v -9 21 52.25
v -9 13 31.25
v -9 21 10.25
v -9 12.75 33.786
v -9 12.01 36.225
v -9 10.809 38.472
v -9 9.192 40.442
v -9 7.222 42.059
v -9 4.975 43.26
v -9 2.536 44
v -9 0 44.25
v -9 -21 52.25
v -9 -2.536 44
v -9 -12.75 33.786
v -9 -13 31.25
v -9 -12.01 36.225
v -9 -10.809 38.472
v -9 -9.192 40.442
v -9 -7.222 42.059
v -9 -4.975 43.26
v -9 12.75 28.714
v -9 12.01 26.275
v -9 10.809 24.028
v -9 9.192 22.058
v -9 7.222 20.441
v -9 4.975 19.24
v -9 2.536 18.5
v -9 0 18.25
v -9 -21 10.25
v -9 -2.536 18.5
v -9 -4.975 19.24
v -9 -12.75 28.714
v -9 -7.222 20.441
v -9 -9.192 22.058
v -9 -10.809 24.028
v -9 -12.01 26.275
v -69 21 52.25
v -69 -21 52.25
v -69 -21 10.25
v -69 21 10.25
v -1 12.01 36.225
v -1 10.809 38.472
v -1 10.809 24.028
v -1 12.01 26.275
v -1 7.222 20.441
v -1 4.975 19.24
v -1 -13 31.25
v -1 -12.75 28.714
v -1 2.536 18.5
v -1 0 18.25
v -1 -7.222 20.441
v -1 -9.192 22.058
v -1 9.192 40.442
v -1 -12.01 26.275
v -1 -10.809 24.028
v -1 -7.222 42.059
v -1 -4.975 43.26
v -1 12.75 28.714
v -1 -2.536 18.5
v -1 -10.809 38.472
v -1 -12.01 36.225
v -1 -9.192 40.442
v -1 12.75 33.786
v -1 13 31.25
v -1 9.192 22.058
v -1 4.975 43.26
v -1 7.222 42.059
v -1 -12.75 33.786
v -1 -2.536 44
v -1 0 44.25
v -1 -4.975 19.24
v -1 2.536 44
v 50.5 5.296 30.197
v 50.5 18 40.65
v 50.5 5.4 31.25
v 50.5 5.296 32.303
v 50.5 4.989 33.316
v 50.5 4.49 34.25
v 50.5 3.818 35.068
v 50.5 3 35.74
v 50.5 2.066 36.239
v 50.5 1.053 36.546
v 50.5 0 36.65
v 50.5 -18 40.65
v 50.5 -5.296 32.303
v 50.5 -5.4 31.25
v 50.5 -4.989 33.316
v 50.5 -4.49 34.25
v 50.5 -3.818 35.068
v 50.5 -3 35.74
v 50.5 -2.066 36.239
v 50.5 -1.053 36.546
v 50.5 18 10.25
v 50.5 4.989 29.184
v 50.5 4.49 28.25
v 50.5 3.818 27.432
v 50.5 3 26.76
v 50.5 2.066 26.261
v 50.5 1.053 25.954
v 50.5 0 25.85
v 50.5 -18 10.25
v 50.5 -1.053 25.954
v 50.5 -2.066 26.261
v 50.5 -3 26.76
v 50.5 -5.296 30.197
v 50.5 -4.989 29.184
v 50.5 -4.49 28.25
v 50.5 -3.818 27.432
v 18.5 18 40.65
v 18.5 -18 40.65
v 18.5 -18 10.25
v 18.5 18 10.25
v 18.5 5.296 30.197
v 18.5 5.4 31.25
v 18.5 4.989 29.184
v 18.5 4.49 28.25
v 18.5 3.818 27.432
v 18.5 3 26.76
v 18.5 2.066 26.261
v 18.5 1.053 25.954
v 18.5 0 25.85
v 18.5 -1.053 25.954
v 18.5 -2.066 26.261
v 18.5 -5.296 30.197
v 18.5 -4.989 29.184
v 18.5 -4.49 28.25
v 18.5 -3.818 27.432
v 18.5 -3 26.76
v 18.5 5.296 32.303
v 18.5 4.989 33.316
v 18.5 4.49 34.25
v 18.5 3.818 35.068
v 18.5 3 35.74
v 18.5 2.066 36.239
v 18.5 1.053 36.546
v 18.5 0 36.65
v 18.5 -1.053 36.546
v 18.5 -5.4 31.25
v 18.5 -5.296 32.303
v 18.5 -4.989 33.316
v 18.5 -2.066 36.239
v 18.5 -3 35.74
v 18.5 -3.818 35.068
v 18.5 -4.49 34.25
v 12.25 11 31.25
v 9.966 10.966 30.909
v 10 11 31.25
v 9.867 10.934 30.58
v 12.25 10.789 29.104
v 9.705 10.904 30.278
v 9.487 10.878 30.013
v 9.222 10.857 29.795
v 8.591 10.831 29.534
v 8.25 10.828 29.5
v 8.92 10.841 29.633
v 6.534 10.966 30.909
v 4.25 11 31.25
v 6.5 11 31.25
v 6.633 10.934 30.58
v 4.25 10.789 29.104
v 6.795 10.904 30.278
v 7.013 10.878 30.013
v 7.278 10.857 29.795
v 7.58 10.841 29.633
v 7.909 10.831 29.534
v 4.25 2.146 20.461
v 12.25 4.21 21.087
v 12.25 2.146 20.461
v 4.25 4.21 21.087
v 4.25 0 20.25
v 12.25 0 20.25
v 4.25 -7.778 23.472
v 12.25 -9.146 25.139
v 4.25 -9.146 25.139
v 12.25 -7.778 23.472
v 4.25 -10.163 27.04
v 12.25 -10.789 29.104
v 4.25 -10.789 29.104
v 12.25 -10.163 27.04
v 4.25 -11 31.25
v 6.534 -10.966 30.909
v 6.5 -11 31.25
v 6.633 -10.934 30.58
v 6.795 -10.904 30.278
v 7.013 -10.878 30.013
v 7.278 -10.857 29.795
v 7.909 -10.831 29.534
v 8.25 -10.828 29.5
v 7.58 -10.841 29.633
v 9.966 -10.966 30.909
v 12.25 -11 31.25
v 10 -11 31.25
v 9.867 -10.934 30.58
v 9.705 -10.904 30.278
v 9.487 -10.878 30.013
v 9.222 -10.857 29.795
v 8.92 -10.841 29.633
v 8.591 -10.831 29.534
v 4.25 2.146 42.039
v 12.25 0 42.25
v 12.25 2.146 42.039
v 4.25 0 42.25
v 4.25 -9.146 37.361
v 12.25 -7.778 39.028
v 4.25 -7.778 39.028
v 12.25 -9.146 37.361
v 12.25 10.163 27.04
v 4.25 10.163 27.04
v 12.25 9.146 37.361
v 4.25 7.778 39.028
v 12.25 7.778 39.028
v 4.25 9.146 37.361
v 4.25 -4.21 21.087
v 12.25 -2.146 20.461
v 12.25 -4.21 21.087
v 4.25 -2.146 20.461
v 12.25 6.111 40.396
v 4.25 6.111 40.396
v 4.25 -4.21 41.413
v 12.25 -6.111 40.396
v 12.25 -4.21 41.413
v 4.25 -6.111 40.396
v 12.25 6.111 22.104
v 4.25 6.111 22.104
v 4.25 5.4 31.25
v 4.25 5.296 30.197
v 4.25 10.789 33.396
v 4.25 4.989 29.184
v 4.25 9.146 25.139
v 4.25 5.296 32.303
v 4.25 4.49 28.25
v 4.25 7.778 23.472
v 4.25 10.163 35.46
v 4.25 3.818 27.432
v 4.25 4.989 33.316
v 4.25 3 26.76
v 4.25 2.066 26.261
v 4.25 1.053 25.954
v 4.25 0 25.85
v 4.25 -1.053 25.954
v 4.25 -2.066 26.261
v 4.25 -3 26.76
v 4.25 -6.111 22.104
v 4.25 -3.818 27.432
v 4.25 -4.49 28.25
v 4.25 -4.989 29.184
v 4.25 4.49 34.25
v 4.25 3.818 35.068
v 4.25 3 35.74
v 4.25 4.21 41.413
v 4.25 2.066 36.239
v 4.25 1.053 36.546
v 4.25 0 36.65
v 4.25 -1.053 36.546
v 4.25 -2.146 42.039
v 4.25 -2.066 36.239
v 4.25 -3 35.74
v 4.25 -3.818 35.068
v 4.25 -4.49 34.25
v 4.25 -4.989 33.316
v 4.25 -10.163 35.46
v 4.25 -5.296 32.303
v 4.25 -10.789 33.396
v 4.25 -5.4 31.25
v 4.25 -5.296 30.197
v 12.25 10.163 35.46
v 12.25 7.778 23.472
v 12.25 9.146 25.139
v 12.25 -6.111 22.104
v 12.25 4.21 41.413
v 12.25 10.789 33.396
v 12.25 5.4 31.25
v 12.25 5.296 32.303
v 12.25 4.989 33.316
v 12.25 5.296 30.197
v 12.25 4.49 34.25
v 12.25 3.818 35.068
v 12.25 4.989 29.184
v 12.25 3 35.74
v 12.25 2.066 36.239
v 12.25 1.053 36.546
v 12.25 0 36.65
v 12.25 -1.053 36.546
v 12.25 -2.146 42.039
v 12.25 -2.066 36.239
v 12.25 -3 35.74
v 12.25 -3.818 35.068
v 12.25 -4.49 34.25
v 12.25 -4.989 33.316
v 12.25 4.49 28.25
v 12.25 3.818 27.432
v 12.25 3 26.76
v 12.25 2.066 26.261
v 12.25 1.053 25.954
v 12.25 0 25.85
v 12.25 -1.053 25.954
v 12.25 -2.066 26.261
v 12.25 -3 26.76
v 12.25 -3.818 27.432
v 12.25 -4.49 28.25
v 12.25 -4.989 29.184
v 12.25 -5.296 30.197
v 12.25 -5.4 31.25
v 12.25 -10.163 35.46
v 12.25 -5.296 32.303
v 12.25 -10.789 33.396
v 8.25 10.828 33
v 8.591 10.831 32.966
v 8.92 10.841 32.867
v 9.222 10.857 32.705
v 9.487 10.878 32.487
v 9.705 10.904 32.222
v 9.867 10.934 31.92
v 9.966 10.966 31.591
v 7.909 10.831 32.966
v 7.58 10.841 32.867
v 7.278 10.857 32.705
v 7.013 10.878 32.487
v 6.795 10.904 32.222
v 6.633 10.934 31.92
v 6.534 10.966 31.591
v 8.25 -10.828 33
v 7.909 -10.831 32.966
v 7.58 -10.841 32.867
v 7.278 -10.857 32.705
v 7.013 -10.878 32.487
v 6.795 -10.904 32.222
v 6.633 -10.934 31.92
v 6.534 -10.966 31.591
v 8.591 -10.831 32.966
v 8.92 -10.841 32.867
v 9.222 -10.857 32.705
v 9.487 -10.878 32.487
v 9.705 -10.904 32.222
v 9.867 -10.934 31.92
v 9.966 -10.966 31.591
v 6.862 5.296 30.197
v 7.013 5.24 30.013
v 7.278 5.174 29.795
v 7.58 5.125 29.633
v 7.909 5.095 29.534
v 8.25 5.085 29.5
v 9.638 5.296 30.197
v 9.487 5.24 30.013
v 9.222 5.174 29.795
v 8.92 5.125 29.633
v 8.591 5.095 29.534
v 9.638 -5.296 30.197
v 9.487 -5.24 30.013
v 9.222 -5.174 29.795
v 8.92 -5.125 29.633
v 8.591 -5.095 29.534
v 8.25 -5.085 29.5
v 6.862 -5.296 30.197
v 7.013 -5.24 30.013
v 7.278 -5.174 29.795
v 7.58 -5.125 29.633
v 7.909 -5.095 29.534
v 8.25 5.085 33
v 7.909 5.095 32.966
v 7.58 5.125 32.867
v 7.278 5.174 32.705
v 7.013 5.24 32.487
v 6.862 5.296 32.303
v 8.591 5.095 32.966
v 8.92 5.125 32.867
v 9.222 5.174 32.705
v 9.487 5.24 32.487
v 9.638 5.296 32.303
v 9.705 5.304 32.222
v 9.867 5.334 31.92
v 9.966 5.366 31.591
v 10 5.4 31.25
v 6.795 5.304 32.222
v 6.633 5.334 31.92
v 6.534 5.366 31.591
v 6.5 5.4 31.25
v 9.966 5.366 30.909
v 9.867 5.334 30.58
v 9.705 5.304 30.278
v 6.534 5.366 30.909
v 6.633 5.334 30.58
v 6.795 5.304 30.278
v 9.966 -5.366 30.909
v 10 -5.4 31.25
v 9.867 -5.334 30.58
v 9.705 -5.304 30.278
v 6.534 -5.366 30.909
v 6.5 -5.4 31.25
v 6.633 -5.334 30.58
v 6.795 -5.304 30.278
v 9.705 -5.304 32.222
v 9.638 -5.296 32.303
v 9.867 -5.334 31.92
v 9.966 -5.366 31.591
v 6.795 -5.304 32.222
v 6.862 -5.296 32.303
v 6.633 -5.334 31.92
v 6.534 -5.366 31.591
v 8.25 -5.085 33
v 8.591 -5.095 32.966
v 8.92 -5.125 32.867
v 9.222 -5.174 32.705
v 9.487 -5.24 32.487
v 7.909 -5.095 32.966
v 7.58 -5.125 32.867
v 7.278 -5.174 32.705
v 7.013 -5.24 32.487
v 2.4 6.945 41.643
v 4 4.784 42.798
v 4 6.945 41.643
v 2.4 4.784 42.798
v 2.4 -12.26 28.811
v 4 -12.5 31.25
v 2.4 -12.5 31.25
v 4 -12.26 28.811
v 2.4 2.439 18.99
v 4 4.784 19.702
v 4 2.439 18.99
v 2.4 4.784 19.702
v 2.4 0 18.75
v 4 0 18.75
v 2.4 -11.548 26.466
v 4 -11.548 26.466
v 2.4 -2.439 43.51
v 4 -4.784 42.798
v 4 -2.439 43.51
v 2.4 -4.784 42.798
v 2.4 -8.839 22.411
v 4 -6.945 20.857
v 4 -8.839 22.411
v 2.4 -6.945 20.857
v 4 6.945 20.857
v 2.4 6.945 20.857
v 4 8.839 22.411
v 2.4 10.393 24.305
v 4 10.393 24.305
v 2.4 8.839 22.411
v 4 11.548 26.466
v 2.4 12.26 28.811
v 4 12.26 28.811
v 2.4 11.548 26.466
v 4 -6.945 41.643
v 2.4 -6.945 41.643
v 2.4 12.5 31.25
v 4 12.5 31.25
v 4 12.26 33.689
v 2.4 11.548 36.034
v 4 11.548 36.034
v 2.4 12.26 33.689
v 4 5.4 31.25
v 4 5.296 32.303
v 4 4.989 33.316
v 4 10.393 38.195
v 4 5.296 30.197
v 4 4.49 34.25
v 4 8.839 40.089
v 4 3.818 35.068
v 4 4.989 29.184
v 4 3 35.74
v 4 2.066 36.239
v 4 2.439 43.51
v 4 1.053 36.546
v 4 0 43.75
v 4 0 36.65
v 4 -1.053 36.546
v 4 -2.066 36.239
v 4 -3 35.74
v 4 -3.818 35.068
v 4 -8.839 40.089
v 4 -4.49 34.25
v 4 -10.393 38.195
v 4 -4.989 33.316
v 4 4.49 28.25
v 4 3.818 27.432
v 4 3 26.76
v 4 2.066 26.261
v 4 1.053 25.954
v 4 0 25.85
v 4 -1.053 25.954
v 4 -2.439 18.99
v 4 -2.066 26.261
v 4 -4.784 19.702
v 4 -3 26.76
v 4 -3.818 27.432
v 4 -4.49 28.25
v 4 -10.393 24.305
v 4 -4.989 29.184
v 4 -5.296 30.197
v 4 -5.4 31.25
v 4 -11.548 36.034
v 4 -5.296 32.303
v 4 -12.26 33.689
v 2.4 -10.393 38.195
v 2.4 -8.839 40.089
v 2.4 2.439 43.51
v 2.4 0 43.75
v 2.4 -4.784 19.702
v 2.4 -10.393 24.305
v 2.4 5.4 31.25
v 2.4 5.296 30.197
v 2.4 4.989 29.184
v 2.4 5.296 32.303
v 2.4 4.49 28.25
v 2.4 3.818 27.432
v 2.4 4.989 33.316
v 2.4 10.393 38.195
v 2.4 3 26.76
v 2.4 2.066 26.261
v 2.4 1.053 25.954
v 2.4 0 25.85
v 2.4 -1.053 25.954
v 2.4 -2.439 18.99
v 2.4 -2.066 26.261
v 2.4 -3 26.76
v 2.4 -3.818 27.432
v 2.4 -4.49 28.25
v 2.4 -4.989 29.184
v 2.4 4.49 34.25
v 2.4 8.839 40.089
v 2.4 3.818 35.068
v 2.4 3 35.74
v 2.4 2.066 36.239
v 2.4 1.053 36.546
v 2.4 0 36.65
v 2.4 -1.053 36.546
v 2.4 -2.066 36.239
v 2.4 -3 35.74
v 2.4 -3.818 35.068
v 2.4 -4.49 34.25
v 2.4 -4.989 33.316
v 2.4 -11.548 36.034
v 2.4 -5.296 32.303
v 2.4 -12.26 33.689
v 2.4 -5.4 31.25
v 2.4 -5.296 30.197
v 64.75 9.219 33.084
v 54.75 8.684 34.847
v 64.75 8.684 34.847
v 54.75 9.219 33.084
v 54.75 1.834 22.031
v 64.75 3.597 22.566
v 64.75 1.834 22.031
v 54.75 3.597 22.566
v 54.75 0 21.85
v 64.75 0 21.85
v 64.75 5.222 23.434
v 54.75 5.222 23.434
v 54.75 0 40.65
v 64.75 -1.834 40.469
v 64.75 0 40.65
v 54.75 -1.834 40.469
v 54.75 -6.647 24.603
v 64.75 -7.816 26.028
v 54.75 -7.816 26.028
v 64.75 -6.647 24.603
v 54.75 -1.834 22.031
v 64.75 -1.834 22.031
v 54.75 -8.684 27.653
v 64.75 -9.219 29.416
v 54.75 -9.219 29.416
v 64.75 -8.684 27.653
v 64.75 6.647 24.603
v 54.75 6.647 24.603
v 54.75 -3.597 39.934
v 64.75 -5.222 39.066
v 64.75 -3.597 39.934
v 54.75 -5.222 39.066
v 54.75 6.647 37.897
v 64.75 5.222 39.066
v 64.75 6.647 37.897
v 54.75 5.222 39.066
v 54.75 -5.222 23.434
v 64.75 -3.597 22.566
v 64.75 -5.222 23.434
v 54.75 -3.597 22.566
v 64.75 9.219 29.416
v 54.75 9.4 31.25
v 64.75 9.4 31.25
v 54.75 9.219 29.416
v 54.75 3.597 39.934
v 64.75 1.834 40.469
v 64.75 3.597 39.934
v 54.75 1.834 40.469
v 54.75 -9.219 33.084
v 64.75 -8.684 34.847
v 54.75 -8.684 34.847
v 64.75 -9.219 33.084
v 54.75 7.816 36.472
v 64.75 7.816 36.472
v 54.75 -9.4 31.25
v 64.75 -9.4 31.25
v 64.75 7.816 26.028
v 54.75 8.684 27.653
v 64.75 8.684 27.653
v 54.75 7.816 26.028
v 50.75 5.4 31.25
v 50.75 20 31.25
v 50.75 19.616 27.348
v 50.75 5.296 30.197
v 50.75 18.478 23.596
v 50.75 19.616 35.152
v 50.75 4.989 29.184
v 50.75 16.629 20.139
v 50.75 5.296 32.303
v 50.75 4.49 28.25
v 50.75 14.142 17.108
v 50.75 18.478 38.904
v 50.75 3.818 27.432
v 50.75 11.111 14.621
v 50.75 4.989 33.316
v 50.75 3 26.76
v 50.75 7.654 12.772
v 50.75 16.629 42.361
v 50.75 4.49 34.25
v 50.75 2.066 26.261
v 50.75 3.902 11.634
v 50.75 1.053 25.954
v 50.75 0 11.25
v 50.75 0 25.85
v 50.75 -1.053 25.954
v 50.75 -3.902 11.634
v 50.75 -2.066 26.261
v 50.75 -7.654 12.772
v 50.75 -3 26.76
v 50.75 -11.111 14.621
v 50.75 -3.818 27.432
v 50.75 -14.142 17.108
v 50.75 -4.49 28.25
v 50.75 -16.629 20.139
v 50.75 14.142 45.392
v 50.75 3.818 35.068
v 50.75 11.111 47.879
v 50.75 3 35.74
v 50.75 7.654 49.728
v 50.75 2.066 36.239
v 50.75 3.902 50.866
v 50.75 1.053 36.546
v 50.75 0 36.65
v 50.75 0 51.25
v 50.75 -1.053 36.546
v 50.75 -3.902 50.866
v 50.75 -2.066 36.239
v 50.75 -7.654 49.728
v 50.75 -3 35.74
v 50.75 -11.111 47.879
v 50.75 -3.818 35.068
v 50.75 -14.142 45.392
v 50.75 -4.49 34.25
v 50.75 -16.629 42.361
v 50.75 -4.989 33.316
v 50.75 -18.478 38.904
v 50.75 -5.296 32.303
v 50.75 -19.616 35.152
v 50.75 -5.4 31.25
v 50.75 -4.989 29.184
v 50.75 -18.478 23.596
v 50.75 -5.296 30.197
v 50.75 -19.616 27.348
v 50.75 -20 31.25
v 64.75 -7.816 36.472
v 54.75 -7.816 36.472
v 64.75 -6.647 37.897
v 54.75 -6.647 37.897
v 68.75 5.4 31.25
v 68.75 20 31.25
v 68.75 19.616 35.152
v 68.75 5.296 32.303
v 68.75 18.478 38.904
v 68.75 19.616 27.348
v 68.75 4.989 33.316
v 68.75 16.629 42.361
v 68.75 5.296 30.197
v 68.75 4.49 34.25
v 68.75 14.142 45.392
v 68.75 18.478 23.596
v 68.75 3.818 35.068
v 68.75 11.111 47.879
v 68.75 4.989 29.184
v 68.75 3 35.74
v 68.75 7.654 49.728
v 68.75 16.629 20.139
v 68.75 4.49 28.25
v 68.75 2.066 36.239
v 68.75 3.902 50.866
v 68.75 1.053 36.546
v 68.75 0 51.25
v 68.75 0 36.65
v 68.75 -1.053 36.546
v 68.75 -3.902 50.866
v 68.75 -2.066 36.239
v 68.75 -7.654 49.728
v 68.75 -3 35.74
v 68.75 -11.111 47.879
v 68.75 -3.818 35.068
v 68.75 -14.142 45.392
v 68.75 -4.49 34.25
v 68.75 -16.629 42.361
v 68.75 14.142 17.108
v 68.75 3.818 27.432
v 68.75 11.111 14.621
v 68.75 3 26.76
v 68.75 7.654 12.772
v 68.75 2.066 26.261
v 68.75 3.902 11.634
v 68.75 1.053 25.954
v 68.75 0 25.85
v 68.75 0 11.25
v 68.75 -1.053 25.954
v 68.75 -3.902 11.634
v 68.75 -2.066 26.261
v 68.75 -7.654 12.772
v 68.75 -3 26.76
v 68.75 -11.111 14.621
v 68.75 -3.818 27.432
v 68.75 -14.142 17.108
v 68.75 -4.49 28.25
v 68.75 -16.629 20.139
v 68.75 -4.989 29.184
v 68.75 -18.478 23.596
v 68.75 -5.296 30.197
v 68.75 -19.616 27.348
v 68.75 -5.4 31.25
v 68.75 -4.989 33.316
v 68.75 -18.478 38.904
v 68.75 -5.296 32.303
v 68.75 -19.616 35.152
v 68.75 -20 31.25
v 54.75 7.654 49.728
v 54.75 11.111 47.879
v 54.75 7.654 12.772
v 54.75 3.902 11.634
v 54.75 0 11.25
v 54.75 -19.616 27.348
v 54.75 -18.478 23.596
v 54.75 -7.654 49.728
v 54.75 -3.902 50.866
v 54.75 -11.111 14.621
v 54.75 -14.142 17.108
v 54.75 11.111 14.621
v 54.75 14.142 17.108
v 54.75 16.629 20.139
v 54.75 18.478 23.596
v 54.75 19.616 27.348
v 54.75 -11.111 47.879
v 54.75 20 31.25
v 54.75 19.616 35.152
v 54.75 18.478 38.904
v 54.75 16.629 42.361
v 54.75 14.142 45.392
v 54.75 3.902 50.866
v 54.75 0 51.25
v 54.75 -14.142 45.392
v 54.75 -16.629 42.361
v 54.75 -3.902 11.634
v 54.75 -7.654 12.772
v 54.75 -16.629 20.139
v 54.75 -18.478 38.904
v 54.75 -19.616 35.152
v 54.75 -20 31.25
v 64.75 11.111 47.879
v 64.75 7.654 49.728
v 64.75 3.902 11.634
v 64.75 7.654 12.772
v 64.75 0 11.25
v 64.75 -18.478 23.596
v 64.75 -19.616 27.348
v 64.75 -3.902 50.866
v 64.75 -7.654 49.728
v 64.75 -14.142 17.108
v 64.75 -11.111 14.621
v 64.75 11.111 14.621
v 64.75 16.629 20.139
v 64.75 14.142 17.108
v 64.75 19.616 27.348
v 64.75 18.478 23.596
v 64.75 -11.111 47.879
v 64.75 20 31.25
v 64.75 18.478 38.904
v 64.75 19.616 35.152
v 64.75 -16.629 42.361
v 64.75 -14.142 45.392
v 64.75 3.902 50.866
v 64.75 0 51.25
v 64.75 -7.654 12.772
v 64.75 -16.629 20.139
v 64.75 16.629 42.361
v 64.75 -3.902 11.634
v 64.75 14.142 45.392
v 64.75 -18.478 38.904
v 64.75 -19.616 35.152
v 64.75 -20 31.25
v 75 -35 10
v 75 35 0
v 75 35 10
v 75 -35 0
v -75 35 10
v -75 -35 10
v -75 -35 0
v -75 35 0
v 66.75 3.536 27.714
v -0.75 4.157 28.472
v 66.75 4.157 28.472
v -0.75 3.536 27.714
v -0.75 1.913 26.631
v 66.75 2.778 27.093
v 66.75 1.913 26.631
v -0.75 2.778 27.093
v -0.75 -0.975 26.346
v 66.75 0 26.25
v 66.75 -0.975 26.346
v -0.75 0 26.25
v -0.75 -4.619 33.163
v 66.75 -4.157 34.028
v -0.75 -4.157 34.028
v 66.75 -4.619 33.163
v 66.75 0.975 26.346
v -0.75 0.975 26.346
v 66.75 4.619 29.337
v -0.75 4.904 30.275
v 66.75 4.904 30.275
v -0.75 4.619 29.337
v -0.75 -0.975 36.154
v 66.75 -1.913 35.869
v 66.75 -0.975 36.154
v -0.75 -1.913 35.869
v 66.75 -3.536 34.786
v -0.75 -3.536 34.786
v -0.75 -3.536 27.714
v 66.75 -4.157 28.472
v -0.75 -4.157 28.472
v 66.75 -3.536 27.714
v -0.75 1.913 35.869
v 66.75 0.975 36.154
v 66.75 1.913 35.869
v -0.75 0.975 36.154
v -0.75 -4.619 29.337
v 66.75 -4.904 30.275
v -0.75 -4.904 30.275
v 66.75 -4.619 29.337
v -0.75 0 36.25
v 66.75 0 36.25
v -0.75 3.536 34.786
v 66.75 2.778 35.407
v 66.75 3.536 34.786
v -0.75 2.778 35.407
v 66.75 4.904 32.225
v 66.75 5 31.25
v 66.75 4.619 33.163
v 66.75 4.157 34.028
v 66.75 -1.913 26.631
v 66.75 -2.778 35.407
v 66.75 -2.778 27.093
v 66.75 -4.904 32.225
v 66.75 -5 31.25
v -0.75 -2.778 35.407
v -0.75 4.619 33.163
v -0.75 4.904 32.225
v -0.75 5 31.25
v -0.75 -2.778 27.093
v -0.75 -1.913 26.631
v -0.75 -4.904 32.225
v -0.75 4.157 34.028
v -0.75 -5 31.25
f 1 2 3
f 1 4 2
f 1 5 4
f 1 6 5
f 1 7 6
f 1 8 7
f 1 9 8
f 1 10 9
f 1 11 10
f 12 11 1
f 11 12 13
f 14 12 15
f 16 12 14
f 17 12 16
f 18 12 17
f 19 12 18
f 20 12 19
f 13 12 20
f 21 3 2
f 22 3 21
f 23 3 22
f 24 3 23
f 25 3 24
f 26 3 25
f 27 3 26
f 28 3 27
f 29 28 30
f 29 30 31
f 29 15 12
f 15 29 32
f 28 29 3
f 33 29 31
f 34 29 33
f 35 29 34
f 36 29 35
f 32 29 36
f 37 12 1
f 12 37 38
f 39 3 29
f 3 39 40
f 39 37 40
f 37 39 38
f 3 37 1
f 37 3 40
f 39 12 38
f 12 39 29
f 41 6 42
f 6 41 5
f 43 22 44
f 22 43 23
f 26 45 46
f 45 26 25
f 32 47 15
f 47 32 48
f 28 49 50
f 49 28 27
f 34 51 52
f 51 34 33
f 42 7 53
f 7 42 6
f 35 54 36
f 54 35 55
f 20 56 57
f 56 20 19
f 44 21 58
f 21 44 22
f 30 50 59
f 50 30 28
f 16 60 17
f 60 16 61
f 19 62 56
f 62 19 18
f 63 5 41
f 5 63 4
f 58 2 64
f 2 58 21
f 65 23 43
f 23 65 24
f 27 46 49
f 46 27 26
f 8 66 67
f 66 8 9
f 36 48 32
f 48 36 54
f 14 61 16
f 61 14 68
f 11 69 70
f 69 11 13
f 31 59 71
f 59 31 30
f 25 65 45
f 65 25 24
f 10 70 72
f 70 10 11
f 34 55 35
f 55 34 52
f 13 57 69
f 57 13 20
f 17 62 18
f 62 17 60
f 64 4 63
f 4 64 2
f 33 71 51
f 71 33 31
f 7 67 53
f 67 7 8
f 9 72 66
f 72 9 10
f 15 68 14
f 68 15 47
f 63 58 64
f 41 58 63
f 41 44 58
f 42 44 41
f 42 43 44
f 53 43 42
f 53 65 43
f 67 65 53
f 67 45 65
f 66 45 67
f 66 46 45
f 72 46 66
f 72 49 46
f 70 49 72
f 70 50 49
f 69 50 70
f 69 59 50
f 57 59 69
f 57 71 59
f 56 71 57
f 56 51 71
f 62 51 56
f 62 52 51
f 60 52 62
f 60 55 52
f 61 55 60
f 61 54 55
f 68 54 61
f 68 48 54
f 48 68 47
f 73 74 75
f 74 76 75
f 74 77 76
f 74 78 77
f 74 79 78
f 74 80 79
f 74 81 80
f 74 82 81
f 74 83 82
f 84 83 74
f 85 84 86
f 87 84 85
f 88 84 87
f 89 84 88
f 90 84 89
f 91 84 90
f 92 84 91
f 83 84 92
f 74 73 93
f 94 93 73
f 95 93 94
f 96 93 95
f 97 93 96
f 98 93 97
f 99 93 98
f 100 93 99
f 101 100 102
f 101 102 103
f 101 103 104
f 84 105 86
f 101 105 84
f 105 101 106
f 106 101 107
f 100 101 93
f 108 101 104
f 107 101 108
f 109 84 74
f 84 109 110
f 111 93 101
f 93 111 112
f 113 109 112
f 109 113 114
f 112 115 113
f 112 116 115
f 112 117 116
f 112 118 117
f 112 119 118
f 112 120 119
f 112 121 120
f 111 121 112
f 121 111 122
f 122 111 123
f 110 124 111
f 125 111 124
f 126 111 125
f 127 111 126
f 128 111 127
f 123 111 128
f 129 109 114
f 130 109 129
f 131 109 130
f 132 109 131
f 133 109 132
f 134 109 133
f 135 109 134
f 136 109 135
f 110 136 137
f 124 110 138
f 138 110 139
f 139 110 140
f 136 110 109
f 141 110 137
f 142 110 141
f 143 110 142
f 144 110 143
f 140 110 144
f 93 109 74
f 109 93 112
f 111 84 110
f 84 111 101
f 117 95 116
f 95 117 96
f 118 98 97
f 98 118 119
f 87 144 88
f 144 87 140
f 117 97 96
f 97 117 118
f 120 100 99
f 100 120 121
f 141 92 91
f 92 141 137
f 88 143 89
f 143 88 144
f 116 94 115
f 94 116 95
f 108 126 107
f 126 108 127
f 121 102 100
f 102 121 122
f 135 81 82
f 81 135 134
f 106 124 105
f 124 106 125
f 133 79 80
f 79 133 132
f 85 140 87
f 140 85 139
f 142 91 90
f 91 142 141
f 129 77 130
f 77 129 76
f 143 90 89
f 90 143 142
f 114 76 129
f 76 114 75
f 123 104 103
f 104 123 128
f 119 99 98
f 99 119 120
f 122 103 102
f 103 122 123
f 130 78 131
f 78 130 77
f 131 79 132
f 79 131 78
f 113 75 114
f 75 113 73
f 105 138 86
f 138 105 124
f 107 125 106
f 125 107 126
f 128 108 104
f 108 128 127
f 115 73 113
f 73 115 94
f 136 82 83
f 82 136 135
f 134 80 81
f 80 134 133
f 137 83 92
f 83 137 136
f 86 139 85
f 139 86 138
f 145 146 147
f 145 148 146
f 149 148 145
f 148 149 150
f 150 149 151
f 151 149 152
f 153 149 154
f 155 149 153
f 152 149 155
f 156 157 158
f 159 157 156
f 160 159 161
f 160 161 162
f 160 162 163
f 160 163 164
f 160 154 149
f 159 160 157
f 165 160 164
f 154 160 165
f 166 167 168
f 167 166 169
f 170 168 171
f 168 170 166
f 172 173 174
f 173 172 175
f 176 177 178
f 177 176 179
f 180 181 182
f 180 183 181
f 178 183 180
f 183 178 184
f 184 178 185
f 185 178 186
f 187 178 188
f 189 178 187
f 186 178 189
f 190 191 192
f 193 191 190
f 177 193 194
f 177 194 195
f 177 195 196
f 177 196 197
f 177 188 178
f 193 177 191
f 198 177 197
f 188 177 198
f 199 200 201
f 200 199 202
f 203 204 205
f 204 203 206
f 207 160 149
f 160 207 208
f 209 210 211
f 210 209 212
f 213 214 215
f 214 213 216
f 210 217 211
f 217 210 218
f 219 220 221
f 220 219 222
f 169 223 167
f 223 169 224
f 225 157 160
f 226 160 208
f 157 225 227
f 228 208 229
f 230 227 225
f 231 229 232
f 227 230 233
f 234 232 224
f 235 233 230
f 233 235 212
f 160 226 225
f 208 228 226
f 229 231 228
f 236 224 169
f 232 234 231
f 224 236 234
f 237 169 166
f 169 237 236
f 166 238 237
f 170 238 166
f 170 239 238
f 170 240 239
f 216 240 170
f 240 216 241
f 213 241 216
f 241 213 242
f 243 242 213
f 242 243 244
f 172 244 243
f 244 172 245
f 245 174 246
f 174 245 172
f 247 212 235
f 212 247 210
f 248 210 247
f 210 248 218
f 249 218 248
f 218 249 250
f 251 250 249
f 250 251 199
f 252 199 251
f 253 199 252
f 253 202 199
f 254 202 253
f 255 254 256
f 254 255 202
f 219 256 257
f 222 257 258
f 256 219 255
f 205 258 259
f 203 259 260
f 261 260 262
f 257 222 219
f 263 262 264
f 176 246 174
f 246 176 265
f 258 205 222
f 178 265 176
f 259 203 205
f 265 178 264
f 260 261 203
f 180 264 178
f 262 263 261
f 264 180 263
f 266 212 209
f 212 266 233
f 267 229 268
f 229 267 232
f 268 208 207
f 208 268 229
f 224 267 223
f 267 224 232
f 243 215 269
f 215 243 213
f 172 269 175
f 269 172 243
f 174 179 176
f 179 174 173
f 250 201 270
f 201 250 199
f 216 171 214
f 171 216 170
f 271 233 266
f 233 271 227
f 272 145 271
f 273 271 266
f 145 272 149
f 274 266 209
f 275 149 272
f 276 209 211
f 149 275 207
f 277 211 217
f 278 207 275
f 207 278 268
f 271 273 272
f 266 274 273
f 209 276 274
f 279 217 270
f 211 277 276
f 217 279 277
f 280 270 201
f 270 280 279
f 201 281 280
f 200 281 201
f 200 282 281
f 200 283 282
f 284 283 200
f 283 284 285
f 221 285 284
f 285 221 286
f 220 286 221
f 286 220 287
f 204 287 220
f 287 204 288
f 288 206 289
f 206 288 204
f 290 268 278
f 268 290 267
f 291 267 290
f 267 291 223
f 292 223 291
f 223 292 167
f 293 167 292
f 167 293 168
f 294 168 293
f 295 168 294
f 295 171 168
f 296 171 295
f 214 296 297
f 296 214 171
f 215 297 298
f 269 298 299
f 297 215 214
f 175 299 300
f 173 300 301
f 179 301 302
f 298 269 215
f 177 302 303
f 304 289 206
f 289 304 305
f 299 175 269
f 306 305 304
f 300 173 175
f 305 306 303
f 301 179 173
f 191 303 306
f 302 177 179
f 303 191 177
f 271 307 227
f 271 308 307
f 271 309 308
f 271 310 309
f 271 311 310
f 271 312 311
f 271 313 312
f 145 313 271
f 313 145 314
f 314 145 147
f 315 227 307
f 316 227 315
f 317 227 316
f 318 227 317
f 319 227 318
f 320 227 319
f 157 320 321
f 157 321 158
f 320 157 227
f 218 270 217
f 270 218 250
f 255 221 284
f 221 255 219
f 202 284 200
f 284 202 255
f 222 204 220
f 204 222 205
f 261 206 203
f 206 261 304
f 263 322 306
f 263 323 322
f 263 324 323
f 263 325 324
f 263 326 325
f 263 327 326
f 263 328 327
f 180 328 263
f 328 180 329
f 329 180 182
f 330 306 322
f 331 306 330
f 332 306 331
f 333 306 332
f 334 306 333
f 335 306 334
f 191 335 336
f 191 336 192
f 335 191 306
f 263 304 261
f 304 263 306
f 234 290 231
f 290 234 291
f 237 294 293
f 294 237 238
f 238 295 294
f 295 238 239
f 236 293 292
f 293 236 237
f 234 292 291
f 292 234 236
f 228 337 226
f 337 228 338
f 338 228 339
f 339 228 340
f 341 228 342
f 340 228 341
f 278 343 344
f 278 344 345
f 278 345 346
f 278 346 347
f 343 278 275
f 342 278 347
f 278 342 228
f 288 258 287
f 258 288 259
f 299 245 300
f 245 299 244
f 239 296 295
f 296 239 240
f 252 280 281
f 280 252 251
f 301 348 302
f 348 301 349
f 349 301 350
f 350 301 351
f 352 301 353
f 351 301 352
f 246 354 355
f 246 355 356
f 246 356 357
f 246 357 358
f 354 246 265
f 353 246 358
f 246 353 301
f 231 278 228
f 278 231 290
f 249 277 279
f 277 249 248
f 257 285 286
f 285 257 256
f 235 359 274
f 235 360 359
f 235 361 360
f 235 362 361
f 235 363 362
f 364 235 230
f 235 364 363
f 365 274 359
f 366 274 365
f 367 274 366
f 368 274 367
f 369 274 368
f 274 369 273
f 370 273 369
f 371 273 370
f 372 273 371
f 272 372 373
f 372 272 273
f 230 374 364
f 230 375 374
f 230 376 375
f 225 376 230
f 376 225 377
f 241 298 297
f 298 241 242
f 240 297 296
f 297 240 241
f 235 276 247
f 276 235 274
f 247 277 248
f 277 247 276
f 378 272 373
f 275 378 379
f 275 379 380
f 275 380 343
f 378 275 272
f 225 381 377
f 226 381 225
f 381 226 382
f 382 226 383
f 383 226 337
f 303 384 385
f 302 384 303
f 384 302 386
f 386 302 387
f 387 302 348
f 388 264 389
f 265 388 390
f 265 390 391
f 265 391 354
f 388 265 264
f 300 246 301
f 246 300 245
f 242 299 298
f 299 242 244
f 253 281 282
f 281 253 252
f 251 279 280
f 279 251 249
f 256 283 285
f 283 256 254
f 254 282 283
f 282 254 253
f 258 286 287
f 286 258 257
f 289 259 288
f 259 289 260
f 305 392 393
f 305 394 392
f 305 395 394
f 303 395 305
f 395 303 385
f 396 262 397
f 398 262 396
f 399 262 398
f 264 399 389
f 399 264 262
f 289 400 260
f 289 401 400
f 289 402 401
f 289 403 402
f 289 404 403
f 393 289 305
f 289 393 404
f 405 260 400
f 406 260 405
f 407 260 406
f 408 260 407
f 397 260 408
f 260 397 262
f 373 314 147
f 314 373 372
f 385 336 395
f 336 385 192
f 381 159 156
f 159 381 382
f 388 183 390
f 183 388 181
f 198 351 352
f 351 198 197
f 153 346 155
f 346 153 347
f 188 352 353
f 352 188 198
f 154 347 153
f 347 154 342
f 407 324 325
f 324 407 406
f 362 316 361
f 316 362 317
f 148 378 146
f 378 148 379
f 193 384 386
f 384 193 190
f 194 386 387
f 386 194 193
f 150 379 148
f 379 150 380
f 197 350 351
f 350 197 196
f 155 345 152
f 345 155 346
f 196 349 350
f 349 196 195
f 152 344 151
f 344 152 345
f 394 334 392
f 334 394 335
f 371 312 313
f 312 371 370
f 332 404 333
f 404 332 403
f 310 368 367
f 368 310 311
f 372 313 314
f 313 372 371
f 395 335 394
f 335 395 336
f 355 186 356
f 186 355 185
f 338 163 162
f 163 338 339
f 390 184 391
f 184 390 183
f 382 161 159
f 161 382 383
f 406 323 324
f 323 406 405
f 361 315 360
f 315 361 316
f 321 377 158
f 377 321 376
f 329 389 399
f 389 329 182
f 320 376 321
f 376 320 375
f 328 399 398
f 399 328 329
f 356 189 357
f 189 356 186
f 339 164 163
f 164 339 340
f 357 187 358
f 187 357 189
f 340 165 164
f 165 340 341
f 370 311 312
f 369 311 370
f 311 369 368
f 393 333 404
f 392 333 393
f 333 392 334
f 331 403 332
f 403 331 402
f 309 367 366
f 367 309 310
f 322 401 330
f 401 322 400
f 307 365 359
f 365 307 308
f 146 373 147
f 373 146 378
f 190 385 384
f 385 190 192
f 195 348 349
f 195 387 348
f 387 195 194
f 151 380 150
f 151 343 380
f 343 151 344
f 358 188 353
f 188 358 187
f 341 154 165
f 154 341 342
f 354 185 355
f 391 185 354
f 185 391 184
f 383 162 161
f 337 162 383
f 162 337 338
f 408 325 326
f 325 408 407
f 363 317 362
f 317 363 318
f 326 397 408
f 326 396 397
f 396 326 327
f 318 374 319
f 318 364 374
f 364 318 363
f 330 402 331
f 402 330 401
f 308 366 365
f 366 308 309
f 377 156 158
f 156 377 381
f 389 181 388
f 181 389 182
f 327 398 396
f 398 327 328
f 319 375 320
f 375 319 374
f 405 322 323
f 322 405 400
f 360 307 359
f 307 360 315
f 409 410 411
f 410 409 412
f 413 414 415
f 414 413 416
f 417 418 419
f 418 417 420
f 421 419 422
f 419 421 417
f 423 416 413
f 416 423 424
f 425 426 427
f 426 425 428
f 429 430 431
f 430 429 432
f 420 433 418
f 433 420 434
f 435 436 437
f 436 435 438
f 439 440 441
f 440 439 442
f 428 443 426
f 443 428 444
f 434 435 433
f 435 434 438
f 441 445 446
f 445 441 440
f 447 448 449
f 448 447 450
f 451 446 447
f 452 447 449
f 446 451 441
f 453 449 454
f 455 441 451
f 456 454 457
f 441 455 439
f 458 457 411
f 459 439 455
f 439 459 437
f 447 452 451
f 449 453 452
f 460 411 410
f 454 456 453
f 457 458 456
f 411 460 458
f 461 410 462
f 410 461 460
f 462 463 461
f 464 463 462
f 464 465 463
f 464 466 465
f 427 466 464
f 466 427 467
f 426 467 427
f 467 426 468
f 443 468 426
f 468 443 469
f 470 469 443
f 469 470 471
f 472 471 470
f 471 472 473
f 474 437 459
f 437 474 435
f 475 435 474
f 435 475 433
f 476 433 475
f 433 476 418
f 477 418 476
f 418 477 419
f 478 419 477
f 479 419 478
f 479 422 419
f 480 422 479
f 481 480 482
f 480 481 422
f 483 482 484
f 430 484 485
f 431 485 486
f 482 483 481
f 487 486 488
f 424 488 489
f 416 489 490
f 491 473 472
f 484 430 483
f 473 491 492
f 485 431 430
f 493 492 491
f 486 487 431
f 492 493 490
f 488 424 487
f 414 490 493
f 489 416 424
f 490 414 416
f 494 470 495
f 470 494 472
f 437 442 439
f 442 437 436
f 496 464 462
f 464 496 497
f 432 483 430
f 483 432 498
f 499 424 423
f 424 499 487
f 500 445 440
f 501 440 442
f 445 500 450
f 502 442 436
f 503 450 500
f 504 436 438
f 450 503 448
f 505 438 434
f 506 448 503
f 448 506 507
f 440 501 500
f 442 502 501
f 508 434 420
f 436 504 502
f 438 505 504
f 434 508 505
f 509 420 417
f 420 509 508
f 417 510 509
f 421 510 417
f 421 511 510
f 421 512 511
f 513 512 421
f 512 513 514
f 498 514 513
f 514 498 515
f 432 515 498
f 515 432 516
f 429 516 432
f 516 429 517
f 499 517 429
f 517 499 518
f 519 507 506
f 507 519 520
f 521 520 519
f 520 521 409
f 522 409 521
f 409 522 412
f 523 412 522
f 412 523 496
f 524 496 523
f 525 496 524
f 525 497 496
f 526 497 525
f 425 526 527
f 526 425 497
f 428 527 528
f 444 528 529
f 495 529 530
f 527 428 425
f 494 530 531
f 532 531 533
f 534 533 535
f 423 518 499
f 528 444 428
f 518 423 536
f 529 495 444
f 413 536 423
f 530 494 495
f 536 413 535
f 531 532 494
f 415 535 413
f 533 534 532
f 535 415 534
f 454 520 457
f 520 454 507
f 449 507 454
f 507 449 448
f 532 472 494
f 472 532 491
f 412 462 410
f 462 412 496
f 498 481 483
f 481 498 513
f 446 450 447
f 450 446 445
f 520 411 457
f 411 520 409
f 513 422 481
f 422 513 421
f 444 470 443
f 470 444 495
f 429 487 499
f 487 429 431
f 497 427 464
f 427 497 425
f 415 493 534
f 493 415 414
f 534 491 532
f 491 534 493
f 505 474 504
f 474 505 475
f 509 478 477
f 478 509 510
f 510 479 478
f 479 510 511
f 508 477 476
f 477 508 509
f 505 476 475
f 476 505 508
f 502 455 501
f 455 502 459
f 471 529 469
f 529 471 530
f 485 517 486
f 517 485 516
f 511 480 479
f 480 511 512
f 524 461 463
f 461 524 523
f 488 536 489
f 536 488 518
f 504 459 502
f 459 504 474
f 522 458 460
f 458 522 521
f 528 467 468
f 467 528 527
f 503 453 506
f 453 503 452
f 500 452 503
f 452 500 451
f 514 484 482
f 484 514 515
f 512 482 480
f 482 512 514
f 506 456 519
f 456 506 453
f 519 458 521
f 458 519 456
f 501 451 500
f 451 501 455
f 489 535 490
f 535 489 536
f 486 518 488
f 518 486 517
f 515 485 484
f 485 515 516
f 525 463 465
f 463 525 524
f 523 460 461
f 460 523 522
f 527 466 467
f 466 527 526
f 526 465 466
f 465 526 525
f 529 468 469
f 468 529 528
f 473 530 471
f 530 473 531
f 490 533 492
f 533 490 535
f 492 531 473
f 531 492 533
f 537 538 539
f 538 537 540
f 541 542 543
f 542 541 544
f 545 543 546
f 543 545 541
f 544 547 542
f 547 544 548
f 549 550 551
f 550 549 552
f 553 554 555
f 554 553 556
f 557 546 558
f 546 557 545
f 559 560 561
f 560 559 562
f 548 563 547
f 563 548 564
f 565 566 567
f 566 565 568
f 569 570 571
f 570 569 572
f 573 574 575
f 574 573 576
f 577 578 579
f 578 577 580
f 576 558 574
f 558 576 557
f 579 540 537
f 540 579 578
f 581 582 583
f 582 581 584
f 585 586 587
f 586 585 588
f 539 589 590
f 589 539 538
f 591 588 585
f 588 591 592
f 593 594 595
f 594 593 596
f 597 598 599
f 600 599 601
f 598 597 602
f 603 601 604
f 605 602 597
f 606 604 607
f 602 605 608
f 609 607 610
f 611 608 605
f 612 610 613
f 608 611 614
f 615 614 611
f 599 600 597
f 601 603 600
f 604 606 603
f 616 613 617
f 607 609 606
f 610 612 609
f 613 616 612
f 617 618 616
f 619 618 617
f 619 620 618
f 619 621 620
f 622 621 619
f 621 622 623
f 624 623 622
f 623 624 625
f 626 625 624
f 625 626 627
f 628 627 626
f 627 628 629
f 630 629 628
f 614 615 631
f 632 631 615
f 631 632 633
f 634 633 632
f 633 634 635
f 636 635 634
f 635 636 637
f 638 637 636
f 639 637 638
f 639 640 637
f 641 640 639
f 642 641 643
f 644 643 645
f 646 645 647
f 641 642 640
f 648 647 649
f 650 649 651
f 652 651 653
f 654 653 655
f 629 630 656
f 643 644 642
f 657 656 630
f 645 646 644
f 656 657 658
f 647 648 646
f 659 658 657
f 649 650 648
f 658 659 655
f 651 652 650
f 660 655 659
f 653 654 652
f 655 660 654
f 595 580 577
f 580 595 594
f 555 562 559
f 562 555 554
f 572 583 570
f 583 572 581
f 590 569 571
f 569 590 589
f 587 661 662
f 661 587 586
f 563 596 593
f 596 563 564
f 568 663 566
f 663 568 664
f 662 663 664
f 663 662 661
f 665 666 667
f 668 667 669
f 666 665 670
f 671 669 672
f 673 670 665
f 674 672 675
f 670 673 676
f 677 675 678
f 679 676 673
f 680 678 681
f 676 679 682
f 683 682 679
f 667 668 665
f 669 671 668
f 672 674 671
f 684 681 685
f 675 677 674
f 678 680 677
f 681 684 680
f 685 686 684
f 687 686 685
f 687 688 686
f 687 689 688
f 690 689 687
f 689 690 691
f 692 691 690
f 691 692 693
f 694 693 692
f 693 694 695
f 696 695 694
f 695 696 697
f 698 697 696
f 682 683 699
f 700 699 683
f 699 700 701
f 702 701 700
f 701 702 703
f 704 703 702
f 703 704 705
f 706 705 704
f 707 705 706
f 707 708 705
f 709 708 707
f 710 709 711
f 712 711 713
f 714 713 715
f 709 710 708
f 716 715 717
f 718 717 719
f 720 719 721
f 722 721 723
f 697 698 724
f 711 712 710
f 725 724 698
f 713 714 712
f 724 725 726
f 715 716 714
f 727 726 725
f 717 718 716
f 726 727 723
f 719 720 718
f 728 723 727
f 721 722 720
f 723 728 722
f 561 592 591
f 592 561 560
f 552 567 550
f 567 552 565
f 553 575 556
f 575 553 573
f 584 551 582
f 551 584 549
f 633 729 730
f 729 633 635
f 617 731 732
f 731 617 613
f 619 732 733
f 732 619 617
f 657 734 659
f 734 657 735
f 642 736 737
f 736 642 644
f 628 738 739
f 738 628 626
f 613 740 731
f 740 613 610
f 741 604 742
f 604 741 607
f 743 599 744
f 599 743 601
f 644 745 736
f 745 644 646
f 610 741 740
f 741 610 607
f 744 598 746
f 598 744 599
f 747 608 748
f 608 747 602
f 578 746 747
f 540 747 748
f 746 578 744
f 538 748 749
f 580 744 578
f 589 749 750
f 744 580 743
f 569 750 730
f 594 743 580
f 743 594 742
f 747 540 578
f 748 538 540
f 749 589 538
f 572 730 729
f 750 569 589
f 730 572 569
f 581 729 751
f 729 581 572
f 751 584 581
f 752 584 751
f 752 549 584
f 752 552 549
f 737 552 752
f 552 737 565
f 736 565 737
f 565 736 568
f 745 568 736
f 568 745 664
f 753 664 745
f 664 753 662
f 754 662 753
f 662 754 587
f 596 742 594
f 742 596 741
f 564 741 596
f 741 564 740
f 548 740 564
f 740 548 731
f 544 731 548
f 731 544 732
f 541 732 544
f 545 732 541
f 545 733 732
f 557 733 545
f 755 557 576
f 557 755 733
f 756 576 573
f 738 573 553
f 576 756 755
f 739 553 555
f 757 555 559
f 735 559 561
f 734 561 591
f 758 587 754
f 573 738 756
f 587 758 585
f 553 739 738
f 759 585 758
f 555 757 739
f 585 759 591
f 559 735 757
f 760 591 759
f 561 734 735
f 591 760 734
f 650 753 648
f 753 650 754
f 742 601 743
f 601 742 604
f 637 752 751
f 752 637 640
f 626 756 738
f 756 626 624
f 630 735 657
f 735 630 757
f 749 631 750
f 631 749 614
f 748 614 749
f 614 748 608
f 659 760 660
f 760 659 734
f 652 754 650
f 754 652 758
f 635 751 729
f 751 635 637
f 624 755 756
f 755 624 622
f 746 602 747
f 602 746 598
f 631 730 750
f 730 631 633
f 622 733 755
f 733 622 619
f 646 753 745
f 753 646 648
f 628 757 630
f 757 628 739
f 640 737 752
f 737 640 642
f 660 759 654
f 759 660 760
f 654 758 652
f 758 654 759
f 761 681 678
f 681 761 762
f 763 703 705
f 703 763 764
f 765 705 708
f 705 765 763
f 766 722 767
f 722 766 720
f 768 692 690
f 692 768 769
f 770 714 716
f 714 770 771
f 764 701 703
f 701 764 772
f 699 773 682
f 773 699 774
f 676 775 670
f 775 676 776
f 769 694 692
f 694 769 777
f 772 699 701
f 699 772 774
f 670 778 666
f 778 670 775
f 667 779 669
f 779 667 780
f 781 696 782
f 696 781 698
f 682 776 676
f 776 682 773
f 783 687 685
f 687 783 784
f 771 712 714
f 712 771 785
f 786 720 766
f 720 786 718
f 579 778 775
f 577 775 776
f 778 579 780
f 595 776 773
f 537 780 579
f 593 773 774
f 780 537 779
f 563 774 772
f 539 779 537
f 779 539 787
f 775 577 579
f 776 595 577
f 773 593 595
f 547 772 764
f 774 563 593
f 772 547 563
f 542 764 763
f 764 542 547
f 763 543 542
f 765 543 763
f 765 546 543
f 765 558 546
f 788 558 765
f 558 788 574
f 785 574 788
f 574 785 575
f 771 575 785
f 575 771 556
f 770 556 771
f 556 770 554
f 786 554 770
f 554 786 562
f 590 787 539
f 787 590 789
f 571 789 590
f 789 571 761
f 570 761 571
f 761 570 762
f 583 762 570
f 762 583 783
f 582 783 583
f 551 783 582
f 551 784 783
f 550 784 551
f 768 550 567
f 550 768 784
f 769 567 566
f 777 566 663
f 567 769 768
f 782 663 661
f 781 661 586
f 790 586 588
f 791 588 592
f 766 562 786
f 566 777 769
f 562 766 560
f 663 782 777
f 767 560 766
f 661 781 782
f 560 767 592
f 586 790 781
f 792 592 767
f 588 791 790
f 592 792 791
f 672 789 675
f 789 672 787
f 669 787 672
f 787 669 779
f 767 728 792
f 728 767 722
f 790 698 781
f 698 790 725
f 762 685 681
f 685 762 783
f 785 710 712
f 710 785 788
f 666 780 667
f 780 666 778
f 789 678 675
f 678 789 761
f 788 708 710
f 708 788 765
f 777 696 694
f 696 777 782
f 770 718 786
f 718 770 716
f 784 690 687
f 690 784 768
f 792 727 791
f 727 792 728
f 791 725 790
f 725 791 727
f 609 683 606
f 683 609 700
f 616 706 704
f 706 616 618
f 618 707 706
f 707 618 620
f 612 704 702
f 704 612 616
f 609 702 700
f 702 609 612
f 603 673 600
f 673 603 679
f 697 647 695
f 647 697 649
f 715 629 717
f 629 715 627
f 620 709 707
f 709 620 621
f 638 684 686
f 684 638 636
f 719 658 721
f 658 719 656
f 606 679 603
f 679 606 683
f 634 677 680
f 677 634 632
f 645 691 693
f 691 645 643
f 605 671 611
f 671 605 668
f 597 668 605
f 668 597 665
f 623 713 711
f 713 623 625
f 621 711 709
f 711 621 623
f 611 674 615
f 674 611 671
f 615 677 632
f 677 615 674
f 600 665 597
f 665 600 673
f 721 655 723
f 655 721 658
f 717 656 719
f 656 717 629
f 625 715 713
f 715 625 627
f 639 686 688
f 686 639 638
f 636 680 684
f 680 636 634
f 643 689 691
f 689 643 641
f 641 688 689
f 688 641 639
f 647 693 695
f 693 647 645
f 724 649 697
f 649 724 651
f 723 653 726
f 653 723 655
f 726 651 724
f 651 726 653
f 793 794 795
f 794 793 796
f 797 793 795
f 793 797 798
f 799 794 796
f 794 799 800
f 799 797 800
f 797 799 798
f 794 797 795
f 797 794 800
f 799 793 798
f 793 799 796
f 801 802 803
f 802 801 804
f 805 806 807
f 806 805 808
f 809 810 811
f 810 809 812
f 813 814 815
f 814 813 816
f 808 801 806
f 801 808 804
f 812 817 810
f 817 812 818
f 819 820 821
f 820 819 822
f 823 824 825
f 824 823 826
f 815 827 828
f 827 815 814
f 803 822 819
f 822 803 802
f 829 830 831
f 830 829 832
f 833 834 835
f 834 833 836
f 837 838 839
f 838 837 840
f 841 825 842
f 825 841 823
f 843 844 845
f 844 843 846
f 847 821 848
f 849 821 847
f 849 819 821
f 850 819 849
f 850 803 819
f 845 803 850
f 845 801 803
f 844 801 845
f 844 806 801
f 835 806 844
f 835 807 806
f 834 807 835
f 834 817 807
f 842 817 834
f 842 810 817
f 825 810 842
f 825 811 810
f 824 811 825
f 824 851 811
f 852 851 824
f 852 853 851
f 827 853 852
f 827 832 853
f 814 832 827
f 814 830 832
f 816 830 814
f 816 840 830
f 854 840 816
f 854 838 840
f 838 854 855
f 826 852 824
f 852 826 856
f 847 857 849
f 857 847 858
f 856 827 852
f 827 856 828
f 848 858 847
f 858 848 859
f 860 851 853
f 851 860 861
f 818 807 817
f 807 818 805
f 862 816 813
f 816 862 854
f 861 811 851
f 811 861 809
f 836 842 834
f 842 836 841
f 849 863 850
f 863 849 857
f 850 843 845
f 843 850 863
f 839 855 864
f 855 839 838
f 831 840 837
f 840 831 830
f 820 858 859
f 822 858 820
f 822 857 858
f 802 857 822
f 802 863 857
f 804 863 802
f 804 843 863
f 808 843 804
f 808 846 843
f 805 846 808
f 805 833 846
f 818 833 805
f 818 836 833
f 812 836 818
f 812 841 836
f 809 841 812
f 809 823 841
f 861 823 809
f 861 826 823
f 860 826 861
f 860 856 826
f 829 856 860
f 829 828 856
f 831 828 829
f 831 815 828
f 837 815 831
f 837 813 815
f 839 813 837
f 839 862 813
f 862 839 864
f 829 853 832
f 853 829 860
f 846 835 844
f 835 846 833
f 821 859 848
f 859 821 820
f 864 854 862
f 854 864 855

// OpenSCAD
$fn = 32;

// ------------------------------------------------------------------------
// Motor drive station: motor 60 x 42 mm, shaft d10, pulley d40
// Every part is its own module, assembly() places every instance.
// ------------------------------------------------------------------------

// --- part 1 ---
module station_bed() {
  difference() {
    translate([-75, -35, 0]) cube([150, 70, 10]);
  }
}

// --- part 2 ---
module drive_motor() {
  union() {
    translate([-30, -21, 0]) cube([60, 42, 42]);
    translate([34, 0, 21]) rotate([0, 90, 0]) cylinder(h = 8, d = 26, center = true);
  }
}

// --- part 3 ---
module pillow_block() {
  difference() {
    translate([-16, -18, 0]) cube([32, 36, 30.4]);
    translate([0, 0, 21]) rotate([0, 90, 0]) cylinder(h = 34, d = 10.8, center = true);
  }
}

// --- part 4 ---
module drive_shaft() {
  translate([0, 0, -33.75]) cylinder(h = 67.5, d = 10);
}

// --- part 5 ---
module shaft_collar() {
  difference() {
    cylinder(h = 8, d = 22);
    translate([0, 0, -1]) cylinder(h = 10, d = 10.8);
    translate([0, 0, 4]) rotate([90, 0, 0]) cylinder(h = 24, d = 3.5, center = true);
  }
}

// --- part 6 ---
module collar_washer() {
  difference() {
      translate([0, 0, 0]) cylinder(h = 1.6, d = 25);
      translate([0, 0, -1]) cylinder(h = 3.6, d = 10.8);
    }
}

// --- part 7 ---
module drive_pulley() {
  difference() {
    union() {
      cylinder(h = 18, d = 18.8);
      cylinder(h = 4, d = 40);
      translate([0, 0, 14]) cylinder(h = 4, d = 40);
    }
    translate([0, 0, -1]) cylinder(h = 20, d = 10.8);
  }
}

// --- assembly ---
module assembly() {
  color([0.80, 0.24, 0.20]) translate([0, 0, 0]) rotate([0, 0, 0]) station_bed();
  color([0.20, 0.45, 0.75]) translate([-39, 0, 10.25]) rotate([0, 0, 0]) drive_motor();
  color([0.25, 0.62, 0.32]) translate([34.5, 0, 10.25]) rotate([0, 0, 0]) pillow_block();
  color([0.92, 0.70, 0.18]) translate([33, 0, 31.25]) rotate([0, 90, 0]) drive_shaft();
  color([0.58, 0.35, 0.70]) translate([4.25, 0, 31.25]) rotate([0, 90, 0]) shaft_collar();
  color([0.16, 0.66, 0.66]) translate([2.4, 0, 31.25]) rotate([0, 90, 0]) collar_washer();
  color([0.85, 0.48, 0.18]) translate([50.75, 0, 31.25]) rotate([0, 90, 0]) drive_pulley();
}

assembly();
